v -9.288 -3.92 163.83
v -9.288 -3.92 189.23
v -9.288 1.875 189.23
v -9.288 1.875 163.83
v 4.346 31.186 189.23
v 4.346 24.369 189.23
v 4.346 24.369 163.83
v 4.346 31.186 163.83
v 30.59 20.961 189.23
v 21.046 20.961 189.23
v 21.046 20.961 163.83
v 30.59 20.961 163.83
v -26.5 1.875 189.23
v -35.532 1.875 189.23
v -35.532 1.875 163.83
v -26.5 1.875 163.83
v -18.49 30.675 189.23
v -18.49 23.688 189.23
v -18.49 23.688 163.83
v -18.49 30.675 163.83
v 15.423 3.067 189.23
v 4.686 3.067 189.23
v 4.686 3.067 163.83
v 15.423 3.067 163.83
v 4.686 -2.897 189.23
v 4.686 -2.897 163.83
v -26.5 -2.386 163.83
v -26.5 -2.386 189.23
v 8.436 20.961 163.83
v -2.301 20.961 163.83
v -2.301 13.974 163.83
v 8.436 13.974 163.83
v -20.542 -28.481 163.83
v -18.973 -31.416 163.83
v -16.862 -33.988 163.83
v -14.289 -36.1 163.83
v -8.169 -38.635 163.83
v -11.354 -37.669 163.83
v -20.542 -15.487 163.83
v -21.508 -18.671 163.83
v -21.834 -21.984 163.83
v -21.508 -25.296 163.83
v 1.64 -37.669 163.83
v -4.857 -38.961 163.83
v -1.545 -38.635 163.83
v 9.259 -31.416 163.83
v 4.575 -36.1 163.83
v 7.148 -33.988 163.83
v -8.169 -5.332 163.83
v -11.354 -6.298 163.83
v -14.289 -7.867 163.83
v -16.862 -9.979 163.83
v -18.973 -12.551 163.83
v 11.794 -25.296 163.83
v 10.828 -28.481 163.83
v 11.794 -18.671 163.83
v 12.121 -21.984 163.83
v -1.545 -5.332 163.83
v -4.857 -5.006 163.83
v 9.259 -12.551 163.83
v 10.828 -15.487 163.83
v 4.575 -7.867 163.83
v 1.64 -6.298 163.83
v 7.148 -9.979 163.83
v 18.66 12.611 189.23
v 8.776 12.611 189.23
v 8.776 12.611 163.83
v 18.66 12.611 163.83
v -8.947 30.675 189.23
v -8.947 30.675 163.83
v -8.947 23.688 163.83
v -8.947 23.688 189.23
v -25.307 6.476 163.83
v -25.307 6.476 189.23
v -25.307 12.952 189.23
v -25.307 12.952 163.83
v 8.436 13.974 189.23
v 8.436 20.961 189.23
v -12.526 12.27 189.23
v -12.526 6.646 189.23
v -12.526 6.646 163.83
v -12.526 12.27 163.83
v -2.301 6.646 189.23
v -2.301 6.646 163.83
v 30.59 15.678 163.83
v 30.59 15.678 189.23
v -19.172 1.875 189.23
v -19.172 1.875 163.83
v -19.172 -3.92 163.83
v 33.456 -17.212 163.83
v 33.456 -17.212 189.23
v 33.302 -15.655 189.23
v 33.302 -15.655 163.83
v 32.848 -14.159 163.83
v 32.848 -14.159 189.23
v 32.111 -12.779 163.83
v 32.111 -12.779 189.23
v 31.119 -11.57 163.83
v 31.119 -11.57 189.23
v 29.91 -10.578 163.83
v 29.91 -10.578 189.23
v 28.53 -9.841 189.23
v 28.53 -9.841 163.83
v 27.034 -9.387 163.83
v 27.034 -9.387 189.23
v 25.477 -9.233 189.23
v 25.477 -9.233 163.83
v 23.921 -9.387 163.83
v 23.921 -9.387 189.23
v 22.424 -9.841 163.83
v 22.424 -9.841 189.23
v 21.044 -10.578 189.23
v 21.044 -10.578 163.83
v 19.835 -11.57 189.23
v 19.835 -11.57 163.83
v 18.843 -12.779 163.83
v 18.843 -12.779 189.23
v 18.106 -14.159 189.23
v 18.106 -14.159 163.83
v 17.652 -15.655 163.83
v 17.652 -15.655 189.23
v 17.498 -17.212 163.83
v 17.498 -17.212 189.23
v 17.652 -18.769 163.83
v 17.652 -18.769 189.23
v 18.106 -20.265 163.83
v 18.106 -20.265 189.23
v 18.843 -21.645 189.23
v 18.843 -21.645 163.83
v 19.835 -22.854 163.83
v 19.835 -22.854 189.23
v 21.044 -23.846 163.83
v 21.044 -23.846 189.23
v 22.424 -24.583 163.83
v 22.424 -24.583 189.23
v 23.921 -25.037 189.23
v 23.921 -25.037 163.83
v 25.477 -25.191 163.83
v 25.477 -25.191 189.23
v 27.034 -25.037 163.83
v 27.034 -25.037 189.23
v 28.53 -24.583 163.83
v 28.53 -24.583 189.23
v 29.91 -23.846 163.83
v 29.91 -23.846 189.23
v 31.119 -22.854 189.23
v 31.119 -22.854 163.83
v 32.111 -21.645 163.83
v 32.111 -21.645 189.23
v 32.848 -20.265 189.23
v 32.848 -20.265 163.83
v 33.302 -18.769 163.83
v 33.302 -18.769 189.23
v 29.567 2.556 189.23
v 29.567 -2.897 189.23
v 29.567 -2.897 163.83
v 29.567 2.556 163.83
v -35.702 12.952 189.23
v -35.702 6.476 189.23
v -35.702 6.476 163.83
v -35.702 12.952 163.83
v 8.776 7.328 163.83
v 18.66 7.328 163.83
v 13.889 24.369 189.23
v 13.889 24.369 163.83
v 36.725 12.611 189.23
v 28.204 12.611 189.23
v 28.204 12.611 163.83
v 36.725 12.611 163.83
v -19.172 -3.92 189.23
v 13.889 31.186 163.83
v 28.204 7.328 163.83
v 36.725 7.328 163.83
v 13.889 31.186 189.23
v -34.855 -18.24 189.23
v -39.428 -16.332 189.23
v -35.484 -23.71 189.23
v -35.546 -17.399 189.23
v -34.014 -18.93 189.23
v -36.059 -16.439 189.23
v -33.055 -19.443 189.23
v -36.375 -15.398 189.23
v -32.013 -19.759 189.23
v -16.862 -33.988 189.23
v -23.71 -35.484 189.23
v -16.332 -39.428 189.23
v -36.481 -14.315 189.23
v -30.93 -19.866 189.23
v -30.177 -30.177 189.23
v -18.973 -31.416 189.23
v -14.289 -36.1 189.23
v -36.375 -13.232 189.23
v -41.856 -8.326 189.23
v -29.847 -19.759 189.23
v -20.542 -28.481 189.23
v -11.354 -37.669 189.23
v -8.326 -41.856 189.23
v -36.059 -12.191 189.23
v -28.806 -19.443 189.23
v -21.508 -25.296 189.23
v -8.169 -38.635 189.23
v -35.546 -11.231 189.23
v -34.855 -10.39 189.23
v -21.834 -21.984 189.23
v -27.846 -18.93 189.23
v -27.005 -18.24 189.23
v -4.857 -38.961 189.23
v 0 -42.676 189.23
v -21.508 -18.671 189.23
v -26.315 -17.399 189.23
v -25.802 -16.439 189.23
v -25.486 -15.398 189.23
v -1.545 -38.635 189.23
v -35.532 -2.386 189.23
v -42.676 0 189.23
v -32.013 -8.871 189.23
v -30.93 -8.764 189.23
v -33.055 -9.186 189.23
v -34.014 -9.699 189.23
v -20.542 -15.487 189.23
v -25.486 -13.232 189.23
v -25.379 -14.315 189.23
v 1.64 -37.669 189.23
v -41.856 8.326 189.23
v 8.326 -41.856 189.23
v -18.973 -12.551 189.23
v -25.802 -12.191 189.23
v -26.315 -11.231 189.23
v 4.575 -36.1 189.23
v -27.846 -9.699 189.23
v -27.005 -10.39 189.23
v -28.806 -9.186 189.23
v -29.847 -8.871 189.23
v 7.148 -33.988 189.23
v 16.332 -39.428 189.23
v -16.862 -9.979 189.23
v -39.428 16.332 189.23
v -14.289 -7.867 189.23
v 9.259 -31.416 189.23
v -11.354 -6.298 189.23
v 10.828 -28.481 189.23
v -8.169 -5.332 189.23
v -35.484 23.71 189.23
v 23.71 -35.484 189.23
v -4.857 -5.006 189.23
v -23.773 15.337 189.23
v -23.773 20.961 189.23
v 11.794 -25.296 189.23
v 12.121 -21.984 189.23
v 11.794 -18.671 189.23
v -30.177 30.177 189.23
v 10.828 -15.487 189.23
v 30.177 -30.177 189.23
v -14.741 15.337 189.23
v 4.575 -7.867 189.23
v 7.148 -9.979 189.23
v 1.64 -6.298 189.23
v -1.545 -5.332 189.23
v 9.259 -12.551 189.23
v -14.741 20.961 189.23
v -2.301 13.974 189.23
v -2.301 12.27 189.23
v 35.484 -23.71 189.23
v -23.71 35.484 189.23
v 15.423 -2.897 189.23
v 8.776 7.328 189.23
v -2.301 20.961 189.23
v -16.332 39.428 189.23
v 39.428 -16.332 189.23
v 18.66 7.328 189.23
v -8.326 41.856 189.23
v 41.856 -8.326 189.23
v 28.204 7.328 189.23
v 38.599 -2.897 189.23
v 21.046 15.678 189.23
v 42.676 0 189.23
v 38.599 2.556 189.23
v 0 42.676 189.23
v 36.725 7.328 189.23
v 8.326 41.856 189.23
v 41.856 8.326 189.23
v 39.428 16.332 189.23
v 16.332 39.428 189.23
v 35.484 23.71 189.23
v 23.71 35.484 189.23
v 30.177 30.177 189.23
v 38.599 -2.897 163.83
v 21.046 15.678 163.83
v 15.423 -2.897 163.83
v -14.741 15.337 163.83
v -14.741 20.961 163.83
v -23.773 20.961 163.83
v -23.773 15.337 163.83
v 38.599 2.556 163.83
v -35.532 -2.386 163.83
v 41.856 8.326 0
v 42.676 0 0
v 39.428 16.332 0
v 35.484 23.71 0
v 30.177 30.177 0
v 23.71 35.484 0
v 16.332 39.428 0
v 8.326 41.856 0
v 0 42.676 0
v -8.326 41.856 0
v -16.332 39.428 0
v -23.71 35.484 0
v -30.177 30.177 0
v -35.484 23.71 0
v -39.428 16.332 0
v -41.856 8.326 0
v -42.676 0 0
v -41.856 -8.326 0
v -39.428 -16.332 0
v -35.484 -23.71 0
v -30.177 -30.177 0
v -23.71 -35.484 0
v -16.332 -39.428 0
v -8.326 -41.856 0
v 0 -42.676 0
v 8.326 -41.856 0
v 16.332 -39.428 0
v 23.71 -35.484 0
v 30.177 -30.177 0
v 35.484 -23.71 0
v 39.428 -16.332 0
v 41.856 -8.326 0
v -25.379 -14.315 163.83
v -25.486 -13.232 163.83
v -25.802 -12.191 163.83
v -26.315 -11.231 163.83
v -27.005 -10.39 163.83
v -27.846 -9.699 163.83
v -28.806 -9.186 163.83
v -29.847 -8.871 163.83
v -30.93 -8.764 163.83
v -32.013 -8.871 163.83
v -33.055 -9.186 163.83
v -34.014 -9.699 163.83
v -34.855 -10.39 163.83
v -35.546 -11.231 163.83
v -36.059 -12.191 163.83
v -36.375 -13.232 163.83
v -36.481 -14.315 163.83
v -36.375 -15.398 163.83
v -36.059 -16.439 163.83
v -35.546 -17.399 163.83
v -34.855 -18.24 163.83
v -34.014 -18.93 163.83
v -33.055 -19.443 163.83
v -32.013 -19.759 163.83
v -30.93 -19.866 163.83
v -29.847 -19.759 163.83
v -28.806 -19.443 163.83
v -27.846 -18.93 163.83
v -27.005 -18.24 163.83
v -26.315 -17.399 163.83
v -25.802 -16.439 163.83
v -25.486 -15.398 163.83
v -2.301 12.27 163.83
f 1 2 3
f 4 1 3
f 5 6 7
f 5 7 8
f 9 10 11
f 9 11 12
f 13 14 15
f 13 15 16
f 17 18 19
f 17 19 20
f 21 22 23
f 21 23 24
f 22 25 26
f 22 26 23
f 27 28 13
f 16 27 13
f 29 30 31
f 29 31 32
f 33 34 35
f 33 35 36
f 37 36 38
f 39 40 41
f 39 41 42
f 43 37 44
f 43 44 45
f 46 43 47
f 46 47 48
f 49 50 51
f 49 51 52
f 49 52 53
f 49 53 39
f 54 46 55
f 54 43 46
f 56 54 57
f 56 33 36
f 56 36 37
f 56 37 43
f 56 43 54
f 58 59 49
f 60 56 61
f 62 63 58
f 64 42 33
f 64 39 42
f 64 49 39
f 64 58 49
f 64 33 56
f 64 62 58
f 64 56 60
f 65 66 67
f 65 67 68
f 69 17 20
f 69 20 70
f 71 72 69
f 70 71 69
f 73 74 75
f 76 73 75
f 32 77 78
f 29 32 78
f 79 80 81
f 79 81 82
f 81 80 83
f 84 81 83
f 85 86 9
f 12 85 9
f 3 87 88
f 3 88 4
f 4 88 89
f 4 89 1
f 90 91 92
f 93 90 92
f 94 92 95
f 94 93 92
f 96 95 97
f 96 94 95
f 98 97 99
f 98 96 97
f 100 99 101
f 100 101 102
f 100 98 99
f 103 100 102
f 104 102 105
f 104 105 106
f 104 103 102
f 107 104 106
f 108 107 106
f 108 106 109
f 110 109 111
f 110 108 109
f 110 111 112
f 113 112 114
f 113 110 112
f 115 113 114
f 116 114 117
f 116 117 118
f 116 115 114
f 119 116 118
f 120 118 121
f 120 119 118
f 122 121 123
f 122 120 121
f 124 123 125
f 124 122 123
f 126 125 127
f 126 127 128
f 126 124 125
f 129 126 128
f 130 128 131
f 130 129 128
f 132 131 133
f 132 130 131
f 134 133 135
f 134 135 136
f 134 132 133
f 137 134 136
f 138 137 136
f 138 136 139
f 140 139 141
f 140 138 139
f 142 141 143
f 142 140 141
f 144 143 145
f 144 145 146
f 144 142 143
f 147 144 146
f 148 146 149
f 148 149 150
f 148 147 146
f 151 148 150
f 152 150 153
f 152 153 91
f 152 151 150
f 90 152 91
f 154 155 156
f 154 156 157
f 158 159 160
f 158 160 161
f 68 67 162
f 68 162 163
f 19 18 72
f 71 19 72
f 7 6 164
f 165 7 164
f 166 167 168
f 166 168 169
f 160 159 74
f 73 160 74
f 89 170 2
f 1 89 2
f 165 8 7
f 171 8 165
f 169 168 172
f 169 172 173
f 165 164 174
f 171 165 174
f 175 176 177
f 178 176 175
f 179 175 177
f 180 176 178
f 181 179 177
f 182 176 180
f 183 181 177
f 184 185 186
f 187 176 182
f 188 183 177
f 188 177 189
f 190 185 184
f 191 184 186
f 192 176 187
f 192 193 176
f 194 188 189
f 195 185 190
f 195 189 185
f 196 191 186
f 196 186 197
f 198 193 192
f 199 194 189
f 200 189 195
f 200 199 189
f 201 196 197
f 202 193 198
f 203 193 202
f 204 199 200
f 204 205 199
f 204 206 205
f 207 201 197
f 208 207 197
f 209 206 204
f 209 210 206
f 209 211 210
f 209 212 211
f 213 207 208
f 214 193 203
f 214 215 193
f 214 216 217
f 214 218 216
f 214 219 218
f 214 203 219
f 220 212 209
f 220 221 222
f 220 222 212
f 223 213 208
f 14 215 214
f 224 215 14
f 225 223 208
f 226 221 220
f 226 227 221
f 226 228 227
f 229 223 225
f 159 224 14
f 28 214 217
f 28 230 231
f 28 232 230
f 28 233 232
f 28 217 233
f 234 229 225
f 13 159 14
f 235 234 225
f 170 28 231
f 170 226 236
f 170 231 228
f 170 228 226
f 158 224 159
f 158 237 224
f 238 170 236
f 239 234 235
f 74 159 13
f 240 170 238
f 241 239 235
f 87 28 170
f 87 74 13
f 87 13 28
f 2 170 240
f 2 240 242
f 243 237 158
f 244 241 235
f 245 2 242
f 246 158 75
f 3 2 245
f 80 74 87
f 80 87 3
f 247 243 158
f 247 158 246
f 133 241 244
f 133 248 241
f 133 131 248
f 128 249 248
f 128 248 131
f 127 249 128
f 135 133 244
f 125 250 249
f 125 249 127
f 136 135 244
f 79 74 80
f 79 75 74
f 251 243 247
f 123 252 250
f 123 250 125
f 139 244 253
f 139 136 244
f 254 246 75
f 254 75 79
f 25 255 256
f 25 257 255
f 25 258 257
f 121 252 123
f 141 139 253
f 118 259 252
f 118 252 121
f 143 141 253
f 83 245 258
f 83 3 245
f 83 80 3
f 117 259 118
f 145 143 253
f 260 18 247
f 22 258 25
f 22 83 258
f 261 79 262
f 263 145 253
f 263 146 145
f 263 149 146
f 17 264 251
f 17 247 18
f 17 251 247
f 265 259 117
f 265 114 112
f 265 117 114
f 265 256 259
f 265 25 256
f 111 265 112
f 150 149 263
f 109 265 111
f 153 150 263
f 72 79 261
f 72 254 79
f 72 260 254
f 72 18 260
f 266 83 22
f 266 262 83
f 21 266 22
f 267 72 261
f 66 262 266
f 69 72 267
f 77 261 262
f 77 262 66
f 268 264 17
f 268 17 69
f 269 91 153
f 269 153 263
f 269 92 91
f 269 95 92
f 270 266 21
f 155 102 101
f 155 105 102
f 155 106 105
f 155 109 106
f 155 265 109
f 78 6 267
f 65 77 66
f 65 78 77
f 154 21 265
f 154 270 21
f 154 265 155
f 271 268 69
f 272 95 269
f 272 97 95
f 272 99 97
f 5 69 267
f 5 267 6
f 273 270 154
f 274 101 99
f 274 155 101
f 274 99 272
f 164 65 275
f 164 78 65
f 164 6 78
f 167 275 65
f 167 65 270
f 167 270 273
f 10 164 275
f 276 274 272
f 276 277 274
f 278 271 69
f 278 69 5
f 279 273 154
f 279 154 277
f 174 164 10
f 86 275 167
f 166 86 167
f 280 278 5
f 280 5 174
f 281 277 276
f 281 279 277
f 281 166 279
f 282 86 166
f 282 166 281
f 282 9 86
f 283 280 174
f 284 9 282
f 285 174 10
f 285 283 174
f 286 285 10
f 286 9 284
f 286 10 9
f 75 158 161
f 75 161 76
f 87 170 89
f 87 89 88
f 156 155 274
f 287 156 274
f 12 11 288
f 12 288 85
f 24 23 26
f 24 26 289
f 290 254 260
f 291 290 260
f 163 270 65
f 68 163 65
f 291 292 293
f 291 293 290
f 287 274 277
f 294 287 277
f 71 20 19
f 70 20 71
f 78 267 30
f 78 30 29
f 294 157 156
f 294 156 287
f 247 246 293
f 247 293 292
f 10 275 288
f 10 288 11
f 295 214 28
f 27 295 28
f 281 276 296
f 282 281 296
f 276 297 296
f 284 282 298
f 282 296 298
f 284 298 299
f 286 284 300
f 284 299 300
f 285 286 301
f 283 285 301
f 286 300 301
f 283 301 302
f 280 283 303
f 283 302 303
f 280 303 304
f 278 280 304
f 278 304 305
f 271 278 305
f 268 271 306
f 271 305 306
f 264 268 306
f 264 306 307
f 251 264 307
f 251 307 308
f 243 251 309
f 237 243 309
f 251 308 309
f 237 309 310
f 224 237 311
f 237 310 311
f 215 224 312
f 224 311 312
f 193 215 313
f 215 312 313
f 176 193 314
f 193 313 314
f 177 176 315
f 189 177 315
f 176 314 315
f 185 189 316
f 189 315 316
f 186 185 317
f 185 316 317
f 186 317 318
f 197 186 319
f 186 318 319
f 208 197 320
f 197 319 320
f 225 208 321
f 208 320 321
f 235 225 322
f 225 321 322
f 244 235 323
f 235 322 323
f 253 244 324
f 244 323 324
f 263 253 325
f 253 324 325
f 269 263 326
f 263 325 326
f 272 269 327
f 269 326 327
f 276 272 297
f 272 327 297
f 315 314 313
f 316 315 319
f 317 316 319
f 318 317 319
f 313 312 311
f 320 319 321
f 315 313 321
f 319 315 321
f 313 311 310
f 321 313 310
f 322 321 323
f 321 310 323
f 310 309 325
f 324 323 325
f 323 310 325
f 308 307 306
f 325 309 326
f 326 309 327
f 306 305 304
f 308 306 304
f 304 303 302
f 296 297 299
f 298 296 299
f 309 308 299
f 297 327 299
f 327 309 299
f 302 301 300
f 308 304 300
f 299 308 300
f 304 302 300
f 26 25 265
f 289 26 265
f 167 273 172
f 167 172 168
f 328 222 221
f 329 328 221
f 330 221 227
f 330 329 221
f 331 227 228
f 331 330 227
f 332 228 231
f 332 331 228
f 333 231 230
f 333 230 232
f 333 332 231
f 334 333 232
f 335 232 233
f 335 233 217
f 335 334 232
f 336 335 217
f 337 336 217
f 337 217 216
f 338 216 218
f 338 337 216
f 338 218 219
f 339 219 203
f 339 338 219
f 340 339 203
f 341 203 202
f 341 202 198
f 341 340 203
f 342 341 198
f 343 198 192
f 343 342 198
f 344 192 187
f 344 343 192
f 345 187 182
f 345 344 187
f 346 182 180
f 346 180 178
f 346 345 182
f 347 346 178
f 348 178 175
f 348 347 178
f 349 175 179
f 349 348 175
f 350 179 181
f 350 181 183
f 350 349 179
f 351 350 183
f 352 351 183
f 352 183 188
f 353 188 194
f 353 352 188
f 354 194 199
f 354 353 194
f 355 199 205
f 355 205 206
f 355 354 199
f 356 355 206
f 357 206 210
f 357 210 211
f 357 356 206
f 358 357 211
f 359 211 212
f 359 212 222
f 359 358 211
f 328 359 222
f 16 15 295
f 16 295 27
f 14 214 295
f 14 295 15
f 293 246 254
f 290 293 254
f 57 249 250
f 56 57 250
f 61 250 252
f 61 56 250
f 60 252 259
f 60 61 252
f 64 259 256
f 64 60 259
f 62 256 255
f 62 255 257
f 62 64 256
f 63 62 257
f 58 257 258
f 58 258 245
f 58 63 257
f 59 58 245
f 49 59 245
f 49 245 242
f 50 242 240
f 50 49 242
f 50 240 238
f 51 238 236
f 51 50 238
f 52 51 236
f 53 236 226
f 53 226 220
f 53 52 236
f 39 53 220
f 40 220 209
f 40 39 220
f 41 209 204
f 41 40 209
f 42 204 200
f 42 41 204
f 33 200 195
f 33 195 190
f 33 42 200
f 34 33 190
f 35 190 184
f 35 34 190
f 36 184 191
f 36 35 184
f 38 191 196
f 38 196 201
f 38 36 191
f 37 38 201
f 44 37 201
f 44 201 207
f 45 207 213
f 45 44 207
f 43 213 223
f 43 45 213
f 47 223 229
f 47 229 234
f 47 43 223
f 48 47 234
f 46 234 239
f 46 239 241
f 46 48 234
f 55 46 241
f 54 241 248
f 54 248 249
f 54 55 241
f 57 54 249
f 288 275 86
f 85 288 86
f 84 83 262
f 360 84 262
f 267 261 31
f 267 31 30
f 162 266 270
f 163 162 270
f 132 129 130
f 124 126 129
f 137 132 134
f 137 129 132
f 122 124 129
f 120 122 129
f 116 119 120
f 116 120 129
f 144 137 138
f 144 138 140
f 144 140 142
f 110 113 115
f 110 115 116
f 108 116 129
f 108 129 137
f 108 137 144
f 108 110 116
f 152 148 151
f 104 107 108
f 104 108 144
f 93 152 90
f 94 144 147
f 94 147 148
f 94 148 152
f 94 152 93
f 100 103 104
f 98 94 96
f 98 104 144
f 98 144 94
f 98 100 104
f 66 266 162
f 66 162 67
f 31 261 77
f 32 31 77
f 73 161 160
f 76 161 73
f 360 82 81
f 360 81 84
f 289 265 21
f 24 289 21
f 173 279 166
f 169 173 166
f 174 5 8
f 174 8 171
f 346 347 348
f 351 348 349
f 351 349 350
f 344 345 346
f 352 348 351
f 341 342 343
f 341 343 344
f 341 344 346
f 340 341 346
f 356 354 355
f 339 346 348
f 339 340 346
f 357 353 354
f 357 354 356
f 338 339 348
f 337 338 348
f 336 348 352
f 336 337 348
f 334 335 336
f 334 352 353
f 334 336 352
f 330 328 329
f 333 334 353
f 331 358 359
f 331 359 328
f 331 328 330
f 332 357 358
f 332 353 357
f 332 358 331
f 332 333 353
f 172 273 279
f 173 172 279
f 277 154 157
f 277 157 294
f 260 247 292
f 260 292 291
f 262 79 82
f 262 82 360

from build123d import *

# Parameters (mm, degrees)
F0_R     = 42.676453
F1_DEPTH = 163.83
F2_R     = 42.676453
F2_R_2   = 16.977509
F2_R_3   = 5.550938
F2_W     = 9.032015
F2_H     = 4.260384
F2_W_2   = 9.884089
F2_H_2   = 5.794122
F2_R_4   = 7.978639
F2_W_3   = 9.032009
F2_H_3   = 5.453291
F2_W_4   = 10.395335
F2_H_4   = 6.475783
F2_W_5   = 10.22492
F2_H_5   = 5.623706
F2_W_6   = 9.032014
F2_W_7   = 9.543261
F2_H_6   = 6.98703
F2_W_8   = 10.736168
F2_H_7   = 5.964537
F2_W_9   = 9.884088
F2_H_8   = 5.282876
F2_W_10  = 10.736166
F2_H_9   = 6.987029
F2_W_11  = 8.520767
F2_W_12  = 9.543257
F2_H_10  = 5.282875
F2_H_11  = 6.816613
F3_DEPTH = 25.4


with BuildPart() as f1:
    # F0 (on Top) → F1 (new body)
    with BuildSketch(Plane.XY):
        Circle(F0_R)
    extrude(amount=F1_DEPTH)

    # F2 (on face) → F3 (join)
    with BuildSketch(Plane.XY.offset(163.83)):
        Circle(F2_R)
        with Locations((-4.856836, -21.983579)):
            Circle(F2_R_2, mode=Mode.SUBTRACT)
        with Locations((-30.930383, -14.314889)):
            Circle(F2_R_3, mode=Mode.SUBTRACT)
        with Locations((-31.015591, -0.255623)):
            Rectangle(F2_W, F2_H, mode=Mode.SUBTRACT)
        with Locations((-14.229681, -1.022492)):
            Rectangle(F2_W_2, F2_H_2, mode=Mode.SUBTRACT)
        with Locations((25.477093, -17.211949)):
            Circle(F2_R_4, mode=Mode.SUBTRACT)
        with Locations((34.083065, -0.170416)):
            Rectangle(F2_W_3, F2_H_3, mode=Mode.SUBTRACT)
        with Locations((-30.504344, 9.713674)):
            Rectangle(F2_W_4, F2_H_4, mode=Mode.SUBTRACT)
        with Locations((-7.413067, 9.458051)):
            Rectangle(F2_W_5, F2_H_5, mode=Mode.SUBTRACT)
        with Locations((-19.256933, 18.149234)):
            Rectangle(F2_W_6, F2_H_5, mode=Mode.SUBTRACT)
        with Locations((-13.718434, 27.181246)):
            Rectangle(F2_W_7, F2_H_6, mode=Mode.SUBTRACT)
        with Locations((10.054506, 0.085207)):
            Rectangle(F2_W_8, F2_H_7, mode=Mode.SUBTRACT)
        with Locations((13.718434, 9.969297)):
            Rectangle(F2_W_9, F2_H_8, mode=Mode.SUBTRACT)
        with Locations((3.067476, 17.467572)):
            Rectangle(F2_W_10, F2_H_9, mode=Mode.SUBTRACT)
        with Locations((32.464124, 9.969297)):
            Rectangle(F2_W_11, F2_H_8, mode=Mode.SUBTRACT)
        with Locations((25.817924, 18.319649)):
            Rectangle(F2_W_12, F2_H_10, mode=Mode.SUBTRACT)
        with Locations((9.11722, 27.777701)):
            Rectangle(F2_W_12, F2_H_11, mode=Mode.SUBTRACT)
    extrude(amount=F3_DEPTH)


solid = f1.part
